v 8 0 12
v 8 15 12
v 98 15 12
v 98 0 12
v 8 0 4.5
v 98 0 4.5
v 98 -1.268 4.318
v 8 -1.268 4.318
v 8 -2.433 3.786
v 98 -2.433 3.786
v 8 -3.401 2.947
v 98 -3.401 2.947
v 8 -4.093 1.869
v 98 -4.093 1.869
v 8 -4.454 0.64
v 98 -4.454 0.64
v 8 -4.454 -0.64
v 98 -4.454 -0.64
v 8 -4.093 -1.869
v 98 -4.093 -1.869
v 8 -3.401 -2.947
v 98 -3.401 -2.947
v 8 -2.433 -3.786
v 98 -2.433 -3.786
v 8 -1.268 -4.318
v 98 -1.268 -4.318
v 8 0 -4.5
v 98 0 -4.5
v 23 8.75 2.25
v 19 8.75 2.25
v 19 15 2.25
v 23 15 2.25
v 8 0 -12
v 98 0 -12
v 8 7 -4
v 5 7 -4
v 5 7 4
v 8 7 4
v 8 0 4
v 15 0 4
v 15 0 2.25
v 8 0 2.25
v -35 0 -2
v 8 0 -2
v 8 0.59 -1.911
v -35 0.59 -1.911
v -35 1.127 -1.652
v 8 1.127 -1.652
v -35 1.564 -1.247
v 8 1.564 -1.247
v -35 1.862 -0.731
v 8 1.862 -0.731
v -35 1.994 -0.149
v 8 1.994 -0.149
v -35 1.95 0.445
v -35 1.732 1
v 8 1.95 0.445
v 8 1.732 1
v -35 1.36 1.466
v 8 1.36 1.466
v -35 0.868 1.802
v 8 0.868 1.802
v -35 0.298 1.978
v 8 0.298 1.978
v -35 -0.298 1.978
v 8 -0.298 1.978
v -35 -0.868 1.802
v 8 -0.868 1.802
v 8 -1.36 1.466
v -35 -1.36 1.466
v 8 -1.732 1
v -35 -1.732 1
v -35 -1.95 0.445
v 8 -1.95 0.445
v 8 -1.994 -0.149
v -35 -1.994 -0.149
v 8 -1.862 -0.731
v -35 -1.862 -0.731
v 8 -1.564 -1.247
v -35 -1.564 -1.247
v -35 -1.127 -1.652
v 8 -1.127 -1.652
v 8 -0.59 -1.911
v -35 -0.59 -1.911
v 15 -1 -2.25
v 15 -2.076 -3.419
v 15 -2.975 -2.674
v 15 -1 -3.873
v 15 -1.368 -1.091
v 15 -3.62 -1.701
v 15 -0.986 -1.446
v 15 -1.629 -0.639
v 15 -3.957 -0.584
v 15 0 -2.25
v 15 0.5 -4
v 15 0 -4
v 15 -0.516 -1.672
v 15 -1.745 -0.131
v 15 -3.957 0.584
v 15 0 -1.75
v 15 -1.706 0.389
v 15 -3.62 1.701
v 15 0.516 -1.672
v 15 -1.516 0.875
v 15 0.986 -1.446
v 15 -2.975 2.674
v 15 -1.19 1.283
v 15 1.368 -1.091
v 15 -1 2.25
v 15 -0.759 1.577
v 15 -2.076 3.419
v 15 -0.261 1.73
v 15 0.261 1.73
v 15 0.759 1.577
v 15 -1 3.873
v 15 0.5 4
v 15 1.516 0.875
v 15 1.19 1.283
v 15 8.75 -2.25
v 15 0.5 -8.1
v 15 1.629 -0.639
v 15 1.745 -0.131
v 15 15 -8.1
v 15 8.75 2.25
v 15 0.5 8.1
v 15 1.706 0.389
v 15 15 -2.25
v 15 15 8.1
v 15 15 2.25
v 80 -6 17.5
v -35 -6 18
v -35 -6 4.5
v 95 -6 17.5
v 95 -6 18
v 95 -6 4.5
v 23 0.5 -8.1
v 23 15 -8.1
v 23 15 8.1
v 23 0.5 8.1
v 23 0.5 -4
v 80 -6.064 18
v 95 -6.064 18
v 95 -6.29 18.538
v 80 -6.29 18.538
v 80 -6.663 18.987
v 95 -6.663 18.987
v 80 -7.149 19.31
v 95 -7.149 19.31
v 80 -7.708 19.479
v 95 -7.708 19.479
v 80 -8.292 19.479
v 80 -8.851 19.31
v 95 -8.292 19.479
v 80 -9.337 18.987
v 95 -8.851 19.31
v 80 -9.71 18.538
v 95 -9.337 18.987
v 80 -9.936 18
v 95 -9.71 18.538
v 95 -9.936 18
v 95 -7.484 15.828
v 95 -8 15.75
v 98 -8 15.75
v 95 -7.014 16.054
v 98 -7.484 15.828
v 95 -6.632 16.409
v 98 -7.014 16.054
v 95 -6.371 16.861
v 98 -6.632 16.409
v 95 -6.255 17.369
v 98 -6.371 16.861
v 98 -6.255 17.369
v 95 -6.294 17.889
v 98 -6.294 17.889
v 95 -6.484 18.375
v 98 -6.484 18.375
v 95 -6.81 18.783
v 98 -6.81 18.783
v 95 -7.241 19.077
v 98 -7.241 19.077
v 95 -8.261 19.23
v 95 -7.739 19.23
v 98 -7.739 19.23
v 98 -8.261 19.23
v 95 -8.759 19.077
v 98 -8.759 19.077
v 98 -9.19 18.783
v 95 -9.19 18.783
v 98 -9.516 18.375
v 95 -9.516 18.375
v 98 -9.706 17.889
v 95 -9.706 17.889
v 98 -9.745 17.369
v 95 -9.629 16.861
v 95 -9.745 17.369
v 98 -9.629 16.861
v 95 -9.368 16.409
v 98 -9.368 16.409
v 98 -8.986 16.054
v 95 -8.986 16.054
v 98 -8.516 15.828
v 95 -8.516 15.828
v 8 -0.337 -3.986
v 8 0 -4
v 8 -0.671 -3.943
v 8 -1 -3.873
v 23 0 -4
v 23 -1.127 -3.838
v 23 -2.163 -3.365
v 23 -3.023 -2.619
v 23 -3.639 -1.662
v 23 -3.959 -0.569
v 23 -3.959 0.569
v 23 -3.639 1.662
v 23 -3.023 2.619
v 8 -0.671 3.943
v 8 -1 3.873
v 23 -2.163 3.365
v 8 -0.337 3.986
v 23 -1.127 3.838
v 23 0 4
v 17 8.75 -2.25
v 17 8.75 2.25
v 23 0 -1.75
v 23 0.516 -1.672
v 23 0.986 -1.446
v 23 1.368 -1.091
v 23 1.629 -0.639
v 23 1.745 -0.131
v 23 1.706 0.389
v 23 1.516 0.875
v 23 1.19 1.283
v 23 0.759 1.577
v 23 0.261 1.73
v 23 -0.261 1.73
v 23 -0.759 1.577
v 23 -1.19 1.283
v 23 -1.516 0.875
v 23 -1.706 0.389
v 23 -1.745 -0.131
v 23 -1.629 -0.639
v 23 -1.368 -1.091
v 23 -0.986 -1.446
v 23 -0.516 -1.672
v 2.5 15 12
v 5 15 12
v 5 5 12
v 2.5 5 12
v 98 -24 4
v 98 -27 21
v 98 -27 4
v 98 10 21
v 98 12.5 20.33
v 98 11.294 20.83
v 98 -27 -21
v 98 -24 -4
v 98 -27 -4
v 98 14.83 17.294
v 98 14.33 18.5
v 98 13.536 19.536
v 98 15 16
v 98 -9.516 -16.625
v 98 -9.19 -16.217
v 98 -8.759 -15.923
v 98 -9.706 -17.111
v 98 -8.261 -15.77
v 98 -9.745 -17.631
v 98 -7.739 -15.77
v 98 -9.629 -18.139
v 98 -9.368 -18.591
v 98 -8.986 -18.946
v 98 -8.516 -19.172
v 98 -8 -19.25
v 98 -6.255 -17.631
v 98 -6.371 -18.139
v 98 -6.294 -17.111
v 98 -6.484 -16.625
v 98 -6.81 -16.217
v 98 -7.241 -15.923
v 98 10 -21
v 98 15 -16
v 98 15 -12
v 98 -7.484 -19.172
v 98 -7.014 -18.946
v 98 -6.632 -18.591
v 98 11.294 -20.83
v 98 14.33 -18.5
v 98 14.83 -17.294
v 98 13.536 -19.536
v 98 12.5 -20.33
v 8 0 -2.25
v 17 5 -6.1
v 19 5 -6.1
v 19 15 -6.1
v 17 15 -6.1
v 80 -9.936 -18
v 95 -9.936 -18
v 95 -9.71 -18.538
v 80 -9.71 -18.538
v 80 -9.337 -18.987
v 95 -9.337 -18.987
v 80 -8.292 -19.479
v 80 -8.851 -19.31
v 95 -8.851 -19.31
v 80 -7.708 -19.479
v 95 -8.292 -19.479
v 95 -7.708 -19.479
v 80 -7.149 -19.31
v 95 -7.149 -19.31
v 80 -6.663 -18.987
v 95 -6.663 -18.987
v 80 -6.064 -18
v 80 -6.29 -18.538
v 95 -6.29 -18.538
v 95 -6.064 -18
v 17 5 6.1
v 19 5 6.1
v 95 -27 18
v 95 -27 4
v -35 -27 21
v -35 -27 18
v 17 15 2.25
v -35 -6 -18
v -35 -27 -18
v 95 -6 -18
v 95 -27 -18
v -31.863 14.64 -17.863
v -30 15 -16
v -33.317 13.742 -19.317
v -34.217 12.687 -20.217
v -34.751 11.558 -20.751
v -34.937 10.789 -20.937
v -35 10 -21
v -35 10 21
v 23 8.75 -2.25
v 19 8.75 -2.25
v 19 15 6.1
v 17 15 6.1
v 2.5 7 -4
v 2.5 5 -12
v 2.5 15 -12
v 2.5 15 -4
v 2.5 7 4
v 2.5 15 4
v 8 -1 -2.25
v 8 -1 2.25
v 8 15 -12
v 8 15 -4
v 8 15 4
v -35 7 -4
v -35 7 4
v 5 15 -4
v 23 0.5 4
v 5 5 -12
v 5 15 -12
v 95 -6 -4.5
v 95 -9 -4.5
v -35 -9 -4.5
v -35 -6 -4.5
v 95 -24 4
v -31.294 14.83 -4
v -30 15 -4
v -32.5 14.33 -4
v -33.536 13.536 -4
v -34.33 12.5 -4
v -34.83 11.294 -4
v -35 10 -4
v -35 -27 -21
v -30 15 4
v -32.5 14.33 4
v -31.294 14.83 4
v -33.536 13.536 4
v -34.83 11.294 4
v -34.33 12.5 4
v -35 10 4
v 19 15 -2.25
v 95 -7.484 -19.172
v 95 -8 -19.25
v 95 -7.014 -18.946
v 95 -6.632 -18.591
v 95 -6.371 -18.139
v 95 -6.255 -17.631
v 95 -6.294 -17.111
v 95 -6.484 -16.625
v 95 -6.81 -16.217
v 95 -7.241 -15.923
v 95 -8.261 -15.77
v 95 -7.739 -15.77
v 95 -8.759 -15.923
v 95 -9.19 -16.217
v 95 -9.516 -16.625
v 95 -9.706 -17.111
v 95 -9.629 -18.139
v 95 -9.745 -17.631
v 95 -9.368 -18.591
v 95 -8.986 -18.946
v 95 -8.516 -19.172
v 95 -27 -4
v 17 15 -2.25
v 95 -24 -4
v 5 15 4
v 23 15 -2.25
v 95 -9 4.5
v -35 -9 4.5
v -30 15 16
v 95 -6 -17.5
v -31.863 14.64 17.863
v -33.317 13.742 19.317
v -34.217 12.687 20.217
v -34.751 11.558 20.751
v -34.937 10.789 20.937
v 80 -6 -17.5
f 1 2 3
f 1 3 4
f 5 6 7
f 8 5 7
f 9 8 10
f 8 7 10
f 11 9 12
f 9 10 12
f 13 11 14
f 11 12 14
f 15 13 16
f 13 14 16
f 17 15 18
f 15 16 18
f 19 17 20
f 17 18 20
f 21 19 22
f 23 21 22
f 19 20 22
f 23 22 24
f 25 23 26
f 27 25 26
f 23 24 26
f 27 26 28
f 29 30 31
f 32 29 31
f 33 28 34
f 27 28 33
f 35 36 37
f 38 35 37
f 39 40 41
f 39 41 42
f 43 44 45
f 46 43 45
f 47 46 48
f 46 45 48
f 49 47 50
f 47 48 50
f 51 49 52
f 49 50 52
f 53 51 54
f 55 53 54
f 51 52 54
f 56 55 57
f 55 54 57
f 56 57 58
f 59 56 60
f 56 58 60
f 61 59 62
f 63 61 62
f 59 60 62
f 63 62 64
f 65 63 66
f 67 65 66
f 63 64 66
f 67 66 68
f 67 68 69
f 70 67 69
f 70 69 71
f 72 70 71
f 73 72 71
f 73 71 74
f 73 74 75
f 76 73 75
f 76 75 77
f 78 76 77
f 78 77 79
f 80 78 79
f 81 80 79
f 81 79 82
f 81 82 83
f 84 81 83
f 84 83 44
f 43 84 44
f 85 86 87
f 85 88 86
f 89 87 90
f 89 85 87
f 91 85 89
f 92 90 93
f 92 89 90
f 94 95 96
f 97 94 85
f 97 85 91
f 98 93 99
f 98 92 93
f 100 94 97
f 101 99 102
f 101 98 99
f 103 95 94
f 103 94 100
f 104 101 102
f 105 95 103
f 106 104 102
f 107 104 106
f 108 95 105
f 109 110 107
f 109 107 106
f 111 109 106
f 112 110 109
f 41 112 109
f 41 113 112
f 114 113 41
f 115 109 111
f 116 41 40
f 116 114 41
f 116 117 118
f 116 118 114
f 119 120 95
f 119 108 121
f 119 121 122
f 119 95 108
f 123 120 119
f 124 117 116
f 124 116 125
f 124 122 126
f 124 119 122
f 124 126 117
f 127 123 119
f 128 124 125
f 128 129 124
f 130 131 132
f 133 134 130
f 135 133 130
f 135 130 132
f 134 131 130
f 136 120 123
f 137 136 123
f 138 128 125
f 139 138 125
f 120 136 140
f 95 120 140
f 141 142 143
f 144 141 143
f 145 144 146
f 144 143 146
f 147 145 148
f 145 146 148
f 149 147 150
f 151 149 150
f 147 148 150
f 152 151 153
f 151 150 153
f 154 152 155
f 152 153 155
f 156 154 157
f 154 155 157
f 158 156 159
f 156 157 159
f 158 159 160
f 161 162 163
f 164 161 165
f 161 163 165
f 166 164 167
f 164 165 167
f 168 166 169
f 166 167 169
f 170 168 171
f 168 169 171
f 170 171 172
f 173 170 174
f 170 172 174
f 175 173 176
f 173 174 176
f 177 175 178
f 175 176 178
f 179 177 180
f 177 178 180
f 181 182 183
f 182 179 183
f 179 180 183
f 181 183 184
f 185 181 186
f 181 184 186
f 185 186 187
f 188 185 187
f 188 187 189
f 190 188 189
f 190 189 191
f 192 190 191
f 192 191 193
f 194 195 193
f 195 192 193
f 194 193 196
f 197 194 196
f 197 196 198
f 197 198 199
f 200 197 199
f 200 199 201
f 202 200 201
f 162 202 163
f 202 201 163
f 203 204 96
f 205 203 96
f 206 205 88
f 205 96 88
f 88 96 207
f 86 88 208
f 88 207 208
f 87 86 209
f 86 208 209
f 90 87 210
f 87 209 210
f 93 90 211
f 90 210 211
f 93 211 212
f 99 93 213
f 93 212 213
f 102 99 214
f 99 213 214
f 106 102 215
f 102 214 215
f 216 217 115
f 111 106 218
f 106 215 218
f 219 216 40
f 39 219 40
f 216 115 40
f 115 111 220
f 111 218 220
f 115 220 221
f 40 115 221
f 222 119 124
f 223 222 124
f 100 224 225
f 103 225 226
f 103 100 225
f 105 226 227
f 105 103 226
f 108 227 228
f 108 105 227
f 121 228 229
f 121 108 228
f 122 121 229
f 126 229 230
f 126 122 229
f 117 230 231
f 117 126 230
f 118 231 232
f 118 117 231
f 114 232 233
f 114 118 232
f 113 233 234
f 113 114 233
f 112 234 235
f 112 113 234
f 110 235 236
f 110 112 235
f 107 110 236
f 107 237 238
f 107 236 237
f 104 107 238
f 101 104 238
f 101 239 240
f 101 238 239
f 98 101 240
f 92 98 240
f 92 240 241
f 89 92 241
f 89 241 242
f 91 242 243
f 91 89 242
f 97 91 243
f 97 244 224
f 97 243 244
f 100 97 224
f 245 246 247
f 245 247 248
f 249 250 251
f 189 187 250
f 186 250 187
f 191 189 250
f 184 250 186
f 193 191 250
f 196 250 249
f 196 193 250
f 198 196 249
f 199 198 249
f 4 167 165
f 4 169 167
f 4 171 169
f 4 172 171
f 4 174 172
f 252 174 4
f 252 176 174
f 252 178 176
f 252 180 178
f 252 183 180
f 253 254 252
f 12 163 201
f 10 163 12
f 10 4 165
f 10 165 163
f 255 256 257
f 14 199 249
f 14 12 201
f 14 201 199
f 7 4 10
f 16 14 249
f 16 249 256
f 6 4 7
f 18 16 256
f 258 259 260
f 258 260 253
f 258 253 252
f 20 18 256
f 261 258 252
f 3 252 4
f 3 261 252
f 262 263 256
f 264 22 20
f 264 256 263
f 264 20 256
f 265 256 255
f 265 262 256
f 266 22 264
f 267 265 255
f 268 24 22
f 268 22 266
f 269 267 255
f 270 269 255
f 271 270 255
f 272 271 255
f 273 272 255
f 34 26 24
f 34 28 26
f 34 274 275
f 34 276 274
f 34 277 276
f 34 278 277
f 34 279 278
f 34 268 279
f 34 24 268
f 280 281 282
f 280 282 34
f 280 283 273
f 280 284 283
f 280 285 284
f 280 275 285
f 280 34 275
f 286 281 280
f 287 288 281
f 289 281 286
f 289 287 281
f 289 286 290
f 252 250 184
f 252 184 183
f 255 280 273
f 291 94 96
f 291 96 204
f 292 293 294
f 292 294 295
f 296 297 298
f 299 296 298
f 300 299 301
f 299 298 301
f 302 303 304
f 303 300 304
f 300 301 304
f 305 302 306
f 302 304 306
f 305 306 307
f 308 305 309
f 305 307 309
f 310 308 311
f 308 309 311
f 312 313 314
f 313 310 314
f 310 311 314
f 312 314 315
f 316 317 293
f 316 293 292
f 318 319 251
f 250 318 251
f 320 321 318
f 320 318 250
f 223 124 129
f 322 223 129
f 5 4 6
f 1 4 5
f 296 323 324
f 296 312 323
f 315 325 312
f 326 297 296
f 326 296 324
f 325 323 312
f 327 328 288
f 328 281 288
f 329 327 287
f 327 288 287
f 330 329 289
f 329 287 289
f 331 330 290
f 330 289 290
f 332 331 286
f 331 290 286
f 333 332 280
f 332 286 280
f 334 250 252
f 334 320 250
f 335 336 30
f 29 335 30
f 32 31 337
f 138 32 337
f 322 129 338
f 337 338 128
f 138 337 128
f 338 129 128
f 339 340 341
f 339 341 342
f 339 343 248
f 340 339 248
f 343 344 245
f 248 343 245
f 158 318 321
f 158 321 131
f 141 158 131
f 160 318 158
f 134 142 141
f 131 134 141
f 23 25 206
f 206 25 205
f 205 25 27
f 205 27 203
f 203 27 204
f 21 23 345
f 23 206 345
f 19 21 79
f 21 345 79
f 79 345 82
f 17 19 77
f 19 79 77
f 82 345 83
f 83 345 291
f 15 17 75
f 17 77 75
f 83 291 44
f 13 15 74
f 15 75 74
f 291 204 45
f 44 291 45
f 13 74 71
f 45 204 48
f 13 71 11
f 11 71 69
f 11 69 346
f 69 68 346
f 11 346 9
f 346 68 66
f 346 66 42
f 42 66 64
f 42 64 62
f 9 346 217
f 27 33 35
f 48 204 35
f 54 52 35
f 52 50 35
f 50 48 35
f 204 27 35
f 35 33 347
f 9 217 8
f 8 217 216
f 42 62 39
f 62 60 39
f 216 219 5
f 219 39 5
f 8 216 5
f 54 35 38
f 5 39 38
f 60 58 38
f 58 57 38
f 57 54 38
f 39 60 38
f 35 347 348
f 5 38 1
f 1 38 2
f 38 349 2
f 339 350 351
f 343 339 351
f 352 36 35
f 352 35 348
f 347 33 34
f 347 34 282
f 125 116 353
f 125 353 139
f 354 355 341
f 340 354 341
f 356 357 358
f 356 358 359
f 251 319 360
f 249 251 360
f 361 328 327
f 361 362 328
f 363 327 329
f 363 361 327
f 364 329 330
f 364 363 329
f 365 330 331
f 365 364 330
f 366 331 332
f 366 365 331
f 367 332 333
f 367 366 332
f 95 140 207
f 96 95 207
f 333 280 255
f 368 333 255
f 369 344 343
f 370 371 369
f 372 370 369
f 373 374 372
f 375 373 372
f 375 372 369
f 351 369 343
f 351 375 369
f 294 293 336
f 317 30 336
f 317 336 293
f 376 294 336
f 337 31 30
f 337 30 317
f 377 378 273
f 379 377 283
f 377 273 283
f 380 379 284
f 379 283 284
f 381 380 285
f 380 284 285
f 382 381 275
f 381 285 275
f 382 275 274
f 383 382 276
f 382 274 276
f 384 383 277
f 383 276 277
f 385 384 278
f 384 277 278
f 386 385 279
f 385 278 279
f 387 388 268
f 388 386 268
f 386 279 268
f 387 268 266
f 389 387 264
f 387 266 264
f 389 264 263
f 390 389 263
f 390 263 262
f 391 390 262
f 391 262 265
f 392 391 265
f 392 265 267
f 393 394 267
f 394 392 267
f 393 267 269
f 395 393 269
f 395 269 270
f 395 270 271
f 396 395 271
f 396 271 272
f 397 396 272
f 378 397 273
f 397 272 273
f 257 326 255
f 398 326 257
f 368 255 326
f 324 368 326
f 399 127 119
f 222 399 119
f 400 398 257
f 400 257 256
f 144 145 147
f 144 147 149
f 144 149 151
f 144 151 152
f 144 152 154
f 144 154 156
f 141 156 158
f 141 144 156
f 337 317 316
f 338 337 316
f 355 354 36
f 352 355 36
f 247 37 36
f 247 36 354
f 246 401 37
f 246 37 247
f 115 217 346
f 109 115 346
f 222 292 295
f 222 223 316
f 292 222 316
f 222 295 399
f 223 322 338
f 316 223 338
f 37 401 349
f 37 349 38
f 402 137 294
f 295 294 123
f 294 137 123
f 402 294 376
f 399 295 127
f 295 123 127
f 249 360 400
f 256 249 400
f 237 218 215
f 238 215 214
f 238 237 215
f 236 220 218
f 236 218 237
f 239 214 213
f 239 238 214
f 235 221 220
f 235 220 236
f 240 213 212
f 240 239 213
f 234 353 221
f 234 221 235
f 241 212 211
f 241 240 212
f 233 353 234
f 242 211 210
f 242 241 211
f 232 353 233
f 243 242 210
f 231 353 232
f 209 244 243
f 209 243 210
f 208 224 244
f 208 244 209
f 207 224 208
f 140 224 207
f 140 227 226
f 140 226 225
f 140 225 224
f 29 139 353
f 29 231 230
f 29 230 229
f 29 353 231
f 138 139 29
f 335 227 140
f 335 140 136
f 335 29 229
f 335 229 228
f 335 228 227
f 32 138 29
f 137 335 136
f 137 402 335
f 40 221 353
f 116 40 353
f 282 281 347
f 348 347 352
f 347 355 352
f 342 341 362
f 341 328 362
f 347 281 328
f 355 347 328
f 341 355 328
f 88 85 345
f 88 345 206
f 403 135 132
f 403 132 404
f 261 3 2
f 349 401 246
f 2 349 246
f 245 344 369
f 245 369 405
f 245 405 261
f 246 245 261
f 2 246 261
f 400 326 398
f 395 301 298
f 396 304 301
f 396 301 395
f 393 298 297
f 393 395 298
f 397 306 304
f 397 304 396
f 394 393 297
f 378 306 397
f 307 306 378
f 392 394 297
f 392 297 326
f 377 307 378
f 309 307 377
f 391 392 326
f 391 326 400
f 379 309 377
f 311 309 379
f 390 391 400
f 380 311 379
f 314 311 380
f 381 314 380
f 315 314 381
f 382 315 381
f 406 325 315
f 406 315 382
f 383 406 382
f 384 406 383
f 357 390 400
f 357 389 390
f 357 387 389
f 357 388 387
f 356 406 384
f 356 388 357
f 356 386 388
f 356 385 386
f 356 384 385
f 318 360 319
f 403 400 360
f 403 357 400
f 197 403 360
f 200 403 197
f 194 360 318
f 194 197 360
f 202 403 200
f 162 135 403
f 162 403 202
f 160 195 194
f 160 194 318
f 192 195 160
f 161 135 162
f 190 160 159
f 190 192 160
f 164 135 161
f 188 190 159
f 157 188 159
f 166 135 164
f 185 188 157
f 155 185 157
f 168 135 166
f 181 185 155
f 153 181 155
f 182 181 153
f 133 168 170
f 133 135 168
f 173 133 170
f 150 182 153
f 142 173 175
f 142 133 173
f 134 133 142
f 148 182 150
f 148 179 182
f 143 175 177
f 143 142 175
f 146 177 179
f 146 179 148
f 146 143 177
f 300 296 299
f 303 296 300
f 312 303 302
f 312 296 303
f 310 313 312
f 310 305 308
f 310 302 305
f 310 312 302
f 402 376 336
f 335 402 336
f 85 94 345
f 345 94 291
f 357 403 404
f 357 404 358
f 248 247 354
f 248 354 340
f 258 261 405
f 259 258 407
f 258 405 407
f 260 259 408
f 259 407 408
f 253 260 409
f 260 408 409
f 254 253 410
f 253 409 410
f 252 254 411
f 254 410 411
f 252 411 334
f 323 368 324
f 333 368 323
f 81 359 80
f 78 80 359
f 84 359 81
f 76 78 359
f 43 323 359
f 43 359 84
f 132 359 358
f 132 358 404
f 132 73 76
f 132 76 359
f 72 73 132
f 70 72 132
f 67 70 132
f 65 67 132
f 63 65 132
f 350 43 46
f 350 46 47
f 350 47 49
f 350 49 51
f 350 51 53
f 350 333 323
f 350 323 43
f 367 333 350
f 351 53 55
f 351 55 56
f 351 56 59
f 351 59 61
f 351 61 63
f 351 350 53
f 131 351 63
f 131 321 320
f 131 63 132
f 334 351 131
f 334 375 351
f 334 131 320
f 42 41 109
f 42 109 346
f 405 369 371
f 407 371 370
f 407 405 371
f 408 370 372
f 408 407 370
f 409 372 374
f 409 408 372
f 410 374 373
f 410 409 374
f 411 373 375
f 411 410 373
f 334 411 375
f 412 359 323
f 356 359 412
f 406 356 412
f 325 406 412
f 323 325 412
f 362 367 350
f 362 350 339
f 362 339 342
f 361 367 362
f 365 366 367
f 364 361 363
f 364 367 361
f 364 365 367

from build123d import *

# Parameters (mm, degrees)
BOSS_EXTRUDE1_DEPTH      = 8
BOSS_EXTRUDE1_DEPTH_BACK = 75
SKETCH3_W                = 2.5
SKETCH3_H                = 24
CUT_EXTRUDE1_DEPTH       = 10
BOSS_EXTRUDE6_DEPTH      = 90
BOSS_EXTRUDE6_DEPTH_BACK = 83
BOSS_EXTRUDE7_DEPTH      = 90
SKETCH8_W                = 7
SKETCH8_H                = 16.2
CUT_EXTRUDE2_DEPTH       = 15
SKETCH9_W                = 2
SKETCH9_H                = 12.2
CUT_EXTRUDE3_DEPTH       = 10
CUT_EXTRUDE4_DEPTH       = 90
CUT_EXTRUDE5_DEPTH       = 75
CUT_EXTRUDE6_DEPTH       = 90
CUT_EXTRUDE6_DEPTH_BACK  = 83
SKETCH13_R               = 1.75
SKETCH14_R               = 2
CUT_EXTRUDE7_DEPTH       = 83
SKETCH16_R               = 1.75
CUT_EXTRUDE8_DEPTH       = 3
CUT_EXTRUDE9_DEPTH       = 170
SKETCH18_R               = 2
CUT_EXTRUDE10_DEPTH      = 15
SKETCH19_W               = 8
SKETCH19_H               = 3
CUT_EXTRUDE11_DEPTH      = 3
CUT_EXTRUDE12_DEPTH      = 7
SKETCH21_W               = 7
SKETCH21_H               = 4.5
CUT_EXTRUDE13_DEPTH      = 17
SKETCH22_W               = 40
SKETCH22_H               = 42
CUT_EXTRUDE14_DEPTH      = 42
FILLET1_R                = 5


with BuildPart() as part:
    # Sketch2 → Boss-Extrude1 (new, two sides: drawn at the far end of the back side and taken through both)
    with BuildSketch(Plane(origin=(0, 0, 0), x_dir=(0, 0, -1), z_dir=(1, 0, 0)).offset(-BOSS_EXTRUDE1_DEPTH_BACK)):
        Polygon((-21, 0), (-21, 15), (-4, 15), (-4, 7), (0, 7), (4, 7), (4, 15), (21, 15), (21, 0), (0, 0), align=None)
    extrude(amount=BOSS_EXTRUDE1_DEPTH + BOSS_EXTRUDE1_DEPTH_BACK)

    # Sketch3 → Cut-Extrude1 (cut)
    with BuildSketch(Plane(origin=(0, 15, 0), x_dir=(-1, 0, 0), z_dir=(0, 1, 0))):
        with Locations((-3.75, 0)):
            Rectangle(SKETCH3_W, SKETCH3_H)
    extrude(amount=-CUT_EXTRUDE1_DEPTH, mode=Mode.SUBTRACT)

    # Sketch6 → Boss-Extrude6 (add, two sides: drawn at the far end of the back side and taken through both)
    with BuildSketch(Plane(origin=(8, 0, 0), x_dir=(0, 0, -1), z_dir=(1, 0, 0)).offset(-BOSS_EXTRUDE6_DEPTH_BACK)):
        Polygon((-12, 15), (-12, 0), (12, 0), (12, 15), (21, 15), (21, -27), (-21, -27), (-21, 15), align=None)
    extrude(amount=BOSS_EXTRUDE6_DEPTH + BOSS_EXTRUDE6_DEPTH_BACK)

    # Sketch7 → Boss-Extrude7 (add)
    with BuildSketch(Plane(origin=(8, 0, 0), x_dir=(0, 0, -1), z_dir=(1, 0, 0))):
        Polygon((2.25, 15), (2.25, 8.75), (-2.25, 8.75), (-2.25, 15), (-8.1, 15), (-8.1, 11), (-8.1, 0), (8.1, 0), (8.1, 11), (8.1, 15), align=None)
    extrude(amount=BOSS_EXTRUDE7_DEPTH)

    # Sketch8 → Cut-Extrude2 (cut)
    with BuildSketch(Plane(origin=(0, 15, 0), x_dir=(-1, 0, 0), z_dir=(0, 1, 0))):
        with Locations((-11.5, 0)):
            Rectangle(SKETCH8_W, SKETCH8_H)
    extrude(amount=-CUT_EXTRUDE2_DEPTH, mode=Mode.SUBTRACT)

    # Sketch9 → Cut-Extrude3 (cut)
    with BuildSketch(Plane(origin=(0, 15, 0), x_dir=(-1, 0, 0), z_dir=(0, 1, 0))):
        with Locations((-18, 0)):
            Rectangle(SKETCH9_W, SKETCH9_H)
    extrude(amount=-CUT_EXTRUDE3_DEPTH, mode=Mode.SUBTRACT)

    # Sketch11 → Cut-Extrude4 (cut)
    with BuildSketch(Plane(origin=(98, 0, 0), x_dir=(0, 0, -1), z_dir=(1, 0, 0))):
        with BuildLine():
            Line((4.5, 0), (8.1, 0))
            Line((8.1, 0), (8.1, 0.5))
            Line((8.1, 0.5), (4, 0.5))
            Line((4, 0.5), (4, 0))
            ThreePointArc((4, 0), (0, -4), (-4, 0))
            Line((-4, 0), (-4, 0.5))
            Line((-4, 0.5), (-8.1, 0.5))
            Line((-8.1, 0.5), (-8.1, 0))
            Line((-8.1, 0), (-4.5, 0))
            ThreePointArc((-4.5, 0), (0, -4.5), (4.5, 0))
        make_face()
    extrude(amount=-CUT_EXTRUDE4_DEPTH, mode=Mode.SUBTRACT)

    # Sketch12 → Cut-Extrude5 (cut)
    with BuildSketch(Plane(origin=(98, 0, 0), x_dir=(0, 0, -1), z_dir=(1, 0, 0))):
        with BuildLine():
            Line((-2.25, 15), (-8.1, 15))
            Line((-8.1, 15), (-8.1, 0.5))
            Line((-8.1, 0.5), (-4, 0.5))
            Line((-4, 0.5), (-4, 0))
            ThreePointArc((-4, 0), (0, -4), (4, 0))
            Line((4, 0), (4, 0.5))
            Line((4, 0.5), (8.1, 0.5))
            Line((8.1, 0.5), (8.1, 15))
            Line((8.1, 15), (2.25, 15))
            Line((2.25, 15), (2.25, 8.75))
            Line((2.25, 8.75), (-2.25, 8.75))
            Line((-2.25, 8.75), (-2.25, 15))
        make_face()
    extrude(amount=-CUT_EXTRUDE5_DEPTH, mode=Mode.SUBTRACT)

    # Sketch13 → Cut-Extrude6 (cut, two sides: drawn at the far end of the back side and taken through both)
    with BuildSketch(Plane(origin=(8, 0, 0), x_dir=(0, 0, -1), z_dir=(1, 0, 0)).offset(-CUT_EXTRUDE6_DEPTH_BACK)):
        Circle(SKETCH13_R)
    extrude(amount=CUT_EXTRUDE6_DEPTH + CUT_EXTRUDE6_DEPTH_BACK, mode=Mode.SUBTRACT)

    # Sketch14 → Cut-Extrude7 (cut)
    with BuildSketch(Plane(origin=(8, 0, 0), x_dir=(0, 0, -1), z_dir=(1, 0, 0))):
        Circle(SKETCH14_R)
    extrude(amount=-CUT_EXTRUDE7_DEPTH, mode=Mode.SUBTRACT)

    # Sketch16 → Cut-Extrude8 (cut)
    with BuildSketch(Plane(origin=(98, 0, 0), x_dir=(0, 0, -1), z_dir=(1, 0, 0))):
        with Locations((17.5, -8)):
            Circle(SKETCH16_R)
        with Locations((-17.5, -8)):
            Circle(SKETCH16_R)
    extrude(amount=-CUT_EXTRUDE8_DEPTH, mode=Mode.SUBTRACT)

    # Sketch17 → Cut-Extrude9 (cut)
    with BuildSketch(Plane(origin=(95, 0, 0), x_dir=(0, 0, -1), z_dir=(1, 0, 0))):
        Polygon((18, -6), (18, -27), (-18, -27), (-18, -6), (-4.5, -6), (-4.5, -9), (4.5, -9), (4.5, -6), align=None)
    extrude(amount=-CUT_EXTRUDE9_DEPTH, mode=Mode.SUBTRACT)

    # Sketch18 → Cut-Extrude10 (cut)
    with BuildSketch(Plane(origin=(95, 0, 0), x_dir=(0, 0, -1), z_dir=(1, 0, 0))):
        with Locations((-17.5, -8)):
            Circle(SKETCH18_R)
        with Locations((17.5, -8)):
            Circle(SKETCH18_R)
    extrude(amount=-CUT_EXTRUDE10_DEPTH, mode=Mode.SUBTRACT)

    # Sketch19 → Cut-Extrude11 (cut)
    with BuildSketch(Plane(origin=(95, 0, 0), x_dir=(0, 0, -1), z_dir=(1, 0, 0))):
        with Locations((0, -25.5)):
            Rectangle(SKETCH19_W, SKETCH19_H)
    extrude(amount=CUT_EXTRUDE11_DEPTH, mode=Mode.SUBTRACT)

    # Sketch20 → Cut-Extrude12 (cut)
    with BuildSketch(Plane(origin=(8, 0, 0), x_dir=(0, 0, -1), z_dir=(1, 0, 0))):
        with BuildLine():
            Line((-3.878333303, -1), (3.878323052, -1.000039756))
            ThreePointArc((3.878323052, -1.000039756), (-2.0528e-05, -4.005180297), (-3.878333303, -1))
        make_face()
    extrude(amount=CUT_EXTRUDE12_DEPTH, mode=Mode.SUBTRACT)

    # Sketch21 → Cut-Extrude13 (cut)
    with BuildSketch(Plane(origin=(0, 15, 0), x_dir=(-1, 0, 0), z_dir=(0, 1, 0))):
        with Locations((-11.5, 0)):
            Rectangle(SKETCH21_W, SKETCH21_H)
    extrude(amount=-CUT_EXTRUDE13_DEPTH, mode=Mode.SUBTRACT)

    # Sketch22 → Cut-Extrude14 (cut)
    with BuildSketch(Plane(origin=(0, 15, 0), x_dir=(-1, 0, 0), z_dir=(0, 1, 0))):
        with Locations((55, 0)):
            Rectangle(SKETCH22_W, SKETCH22_H)
    extrude(amount=-CUT_EXTRUDE14_DEPTH, mode=Mode.SUBTRACT)

    # Fillet1
    fillet1_edges = [part.edges().sort_by_distance(p)[0] for p in [
        (31.5, 15, -21),
        (31.5, 15, 21),
        (-35, 15, 12.5),
        (-35, 15, -12.5),
    ]]
    fillet(fillet1_edges, radius=FILLET1_R)


solid = part.part
